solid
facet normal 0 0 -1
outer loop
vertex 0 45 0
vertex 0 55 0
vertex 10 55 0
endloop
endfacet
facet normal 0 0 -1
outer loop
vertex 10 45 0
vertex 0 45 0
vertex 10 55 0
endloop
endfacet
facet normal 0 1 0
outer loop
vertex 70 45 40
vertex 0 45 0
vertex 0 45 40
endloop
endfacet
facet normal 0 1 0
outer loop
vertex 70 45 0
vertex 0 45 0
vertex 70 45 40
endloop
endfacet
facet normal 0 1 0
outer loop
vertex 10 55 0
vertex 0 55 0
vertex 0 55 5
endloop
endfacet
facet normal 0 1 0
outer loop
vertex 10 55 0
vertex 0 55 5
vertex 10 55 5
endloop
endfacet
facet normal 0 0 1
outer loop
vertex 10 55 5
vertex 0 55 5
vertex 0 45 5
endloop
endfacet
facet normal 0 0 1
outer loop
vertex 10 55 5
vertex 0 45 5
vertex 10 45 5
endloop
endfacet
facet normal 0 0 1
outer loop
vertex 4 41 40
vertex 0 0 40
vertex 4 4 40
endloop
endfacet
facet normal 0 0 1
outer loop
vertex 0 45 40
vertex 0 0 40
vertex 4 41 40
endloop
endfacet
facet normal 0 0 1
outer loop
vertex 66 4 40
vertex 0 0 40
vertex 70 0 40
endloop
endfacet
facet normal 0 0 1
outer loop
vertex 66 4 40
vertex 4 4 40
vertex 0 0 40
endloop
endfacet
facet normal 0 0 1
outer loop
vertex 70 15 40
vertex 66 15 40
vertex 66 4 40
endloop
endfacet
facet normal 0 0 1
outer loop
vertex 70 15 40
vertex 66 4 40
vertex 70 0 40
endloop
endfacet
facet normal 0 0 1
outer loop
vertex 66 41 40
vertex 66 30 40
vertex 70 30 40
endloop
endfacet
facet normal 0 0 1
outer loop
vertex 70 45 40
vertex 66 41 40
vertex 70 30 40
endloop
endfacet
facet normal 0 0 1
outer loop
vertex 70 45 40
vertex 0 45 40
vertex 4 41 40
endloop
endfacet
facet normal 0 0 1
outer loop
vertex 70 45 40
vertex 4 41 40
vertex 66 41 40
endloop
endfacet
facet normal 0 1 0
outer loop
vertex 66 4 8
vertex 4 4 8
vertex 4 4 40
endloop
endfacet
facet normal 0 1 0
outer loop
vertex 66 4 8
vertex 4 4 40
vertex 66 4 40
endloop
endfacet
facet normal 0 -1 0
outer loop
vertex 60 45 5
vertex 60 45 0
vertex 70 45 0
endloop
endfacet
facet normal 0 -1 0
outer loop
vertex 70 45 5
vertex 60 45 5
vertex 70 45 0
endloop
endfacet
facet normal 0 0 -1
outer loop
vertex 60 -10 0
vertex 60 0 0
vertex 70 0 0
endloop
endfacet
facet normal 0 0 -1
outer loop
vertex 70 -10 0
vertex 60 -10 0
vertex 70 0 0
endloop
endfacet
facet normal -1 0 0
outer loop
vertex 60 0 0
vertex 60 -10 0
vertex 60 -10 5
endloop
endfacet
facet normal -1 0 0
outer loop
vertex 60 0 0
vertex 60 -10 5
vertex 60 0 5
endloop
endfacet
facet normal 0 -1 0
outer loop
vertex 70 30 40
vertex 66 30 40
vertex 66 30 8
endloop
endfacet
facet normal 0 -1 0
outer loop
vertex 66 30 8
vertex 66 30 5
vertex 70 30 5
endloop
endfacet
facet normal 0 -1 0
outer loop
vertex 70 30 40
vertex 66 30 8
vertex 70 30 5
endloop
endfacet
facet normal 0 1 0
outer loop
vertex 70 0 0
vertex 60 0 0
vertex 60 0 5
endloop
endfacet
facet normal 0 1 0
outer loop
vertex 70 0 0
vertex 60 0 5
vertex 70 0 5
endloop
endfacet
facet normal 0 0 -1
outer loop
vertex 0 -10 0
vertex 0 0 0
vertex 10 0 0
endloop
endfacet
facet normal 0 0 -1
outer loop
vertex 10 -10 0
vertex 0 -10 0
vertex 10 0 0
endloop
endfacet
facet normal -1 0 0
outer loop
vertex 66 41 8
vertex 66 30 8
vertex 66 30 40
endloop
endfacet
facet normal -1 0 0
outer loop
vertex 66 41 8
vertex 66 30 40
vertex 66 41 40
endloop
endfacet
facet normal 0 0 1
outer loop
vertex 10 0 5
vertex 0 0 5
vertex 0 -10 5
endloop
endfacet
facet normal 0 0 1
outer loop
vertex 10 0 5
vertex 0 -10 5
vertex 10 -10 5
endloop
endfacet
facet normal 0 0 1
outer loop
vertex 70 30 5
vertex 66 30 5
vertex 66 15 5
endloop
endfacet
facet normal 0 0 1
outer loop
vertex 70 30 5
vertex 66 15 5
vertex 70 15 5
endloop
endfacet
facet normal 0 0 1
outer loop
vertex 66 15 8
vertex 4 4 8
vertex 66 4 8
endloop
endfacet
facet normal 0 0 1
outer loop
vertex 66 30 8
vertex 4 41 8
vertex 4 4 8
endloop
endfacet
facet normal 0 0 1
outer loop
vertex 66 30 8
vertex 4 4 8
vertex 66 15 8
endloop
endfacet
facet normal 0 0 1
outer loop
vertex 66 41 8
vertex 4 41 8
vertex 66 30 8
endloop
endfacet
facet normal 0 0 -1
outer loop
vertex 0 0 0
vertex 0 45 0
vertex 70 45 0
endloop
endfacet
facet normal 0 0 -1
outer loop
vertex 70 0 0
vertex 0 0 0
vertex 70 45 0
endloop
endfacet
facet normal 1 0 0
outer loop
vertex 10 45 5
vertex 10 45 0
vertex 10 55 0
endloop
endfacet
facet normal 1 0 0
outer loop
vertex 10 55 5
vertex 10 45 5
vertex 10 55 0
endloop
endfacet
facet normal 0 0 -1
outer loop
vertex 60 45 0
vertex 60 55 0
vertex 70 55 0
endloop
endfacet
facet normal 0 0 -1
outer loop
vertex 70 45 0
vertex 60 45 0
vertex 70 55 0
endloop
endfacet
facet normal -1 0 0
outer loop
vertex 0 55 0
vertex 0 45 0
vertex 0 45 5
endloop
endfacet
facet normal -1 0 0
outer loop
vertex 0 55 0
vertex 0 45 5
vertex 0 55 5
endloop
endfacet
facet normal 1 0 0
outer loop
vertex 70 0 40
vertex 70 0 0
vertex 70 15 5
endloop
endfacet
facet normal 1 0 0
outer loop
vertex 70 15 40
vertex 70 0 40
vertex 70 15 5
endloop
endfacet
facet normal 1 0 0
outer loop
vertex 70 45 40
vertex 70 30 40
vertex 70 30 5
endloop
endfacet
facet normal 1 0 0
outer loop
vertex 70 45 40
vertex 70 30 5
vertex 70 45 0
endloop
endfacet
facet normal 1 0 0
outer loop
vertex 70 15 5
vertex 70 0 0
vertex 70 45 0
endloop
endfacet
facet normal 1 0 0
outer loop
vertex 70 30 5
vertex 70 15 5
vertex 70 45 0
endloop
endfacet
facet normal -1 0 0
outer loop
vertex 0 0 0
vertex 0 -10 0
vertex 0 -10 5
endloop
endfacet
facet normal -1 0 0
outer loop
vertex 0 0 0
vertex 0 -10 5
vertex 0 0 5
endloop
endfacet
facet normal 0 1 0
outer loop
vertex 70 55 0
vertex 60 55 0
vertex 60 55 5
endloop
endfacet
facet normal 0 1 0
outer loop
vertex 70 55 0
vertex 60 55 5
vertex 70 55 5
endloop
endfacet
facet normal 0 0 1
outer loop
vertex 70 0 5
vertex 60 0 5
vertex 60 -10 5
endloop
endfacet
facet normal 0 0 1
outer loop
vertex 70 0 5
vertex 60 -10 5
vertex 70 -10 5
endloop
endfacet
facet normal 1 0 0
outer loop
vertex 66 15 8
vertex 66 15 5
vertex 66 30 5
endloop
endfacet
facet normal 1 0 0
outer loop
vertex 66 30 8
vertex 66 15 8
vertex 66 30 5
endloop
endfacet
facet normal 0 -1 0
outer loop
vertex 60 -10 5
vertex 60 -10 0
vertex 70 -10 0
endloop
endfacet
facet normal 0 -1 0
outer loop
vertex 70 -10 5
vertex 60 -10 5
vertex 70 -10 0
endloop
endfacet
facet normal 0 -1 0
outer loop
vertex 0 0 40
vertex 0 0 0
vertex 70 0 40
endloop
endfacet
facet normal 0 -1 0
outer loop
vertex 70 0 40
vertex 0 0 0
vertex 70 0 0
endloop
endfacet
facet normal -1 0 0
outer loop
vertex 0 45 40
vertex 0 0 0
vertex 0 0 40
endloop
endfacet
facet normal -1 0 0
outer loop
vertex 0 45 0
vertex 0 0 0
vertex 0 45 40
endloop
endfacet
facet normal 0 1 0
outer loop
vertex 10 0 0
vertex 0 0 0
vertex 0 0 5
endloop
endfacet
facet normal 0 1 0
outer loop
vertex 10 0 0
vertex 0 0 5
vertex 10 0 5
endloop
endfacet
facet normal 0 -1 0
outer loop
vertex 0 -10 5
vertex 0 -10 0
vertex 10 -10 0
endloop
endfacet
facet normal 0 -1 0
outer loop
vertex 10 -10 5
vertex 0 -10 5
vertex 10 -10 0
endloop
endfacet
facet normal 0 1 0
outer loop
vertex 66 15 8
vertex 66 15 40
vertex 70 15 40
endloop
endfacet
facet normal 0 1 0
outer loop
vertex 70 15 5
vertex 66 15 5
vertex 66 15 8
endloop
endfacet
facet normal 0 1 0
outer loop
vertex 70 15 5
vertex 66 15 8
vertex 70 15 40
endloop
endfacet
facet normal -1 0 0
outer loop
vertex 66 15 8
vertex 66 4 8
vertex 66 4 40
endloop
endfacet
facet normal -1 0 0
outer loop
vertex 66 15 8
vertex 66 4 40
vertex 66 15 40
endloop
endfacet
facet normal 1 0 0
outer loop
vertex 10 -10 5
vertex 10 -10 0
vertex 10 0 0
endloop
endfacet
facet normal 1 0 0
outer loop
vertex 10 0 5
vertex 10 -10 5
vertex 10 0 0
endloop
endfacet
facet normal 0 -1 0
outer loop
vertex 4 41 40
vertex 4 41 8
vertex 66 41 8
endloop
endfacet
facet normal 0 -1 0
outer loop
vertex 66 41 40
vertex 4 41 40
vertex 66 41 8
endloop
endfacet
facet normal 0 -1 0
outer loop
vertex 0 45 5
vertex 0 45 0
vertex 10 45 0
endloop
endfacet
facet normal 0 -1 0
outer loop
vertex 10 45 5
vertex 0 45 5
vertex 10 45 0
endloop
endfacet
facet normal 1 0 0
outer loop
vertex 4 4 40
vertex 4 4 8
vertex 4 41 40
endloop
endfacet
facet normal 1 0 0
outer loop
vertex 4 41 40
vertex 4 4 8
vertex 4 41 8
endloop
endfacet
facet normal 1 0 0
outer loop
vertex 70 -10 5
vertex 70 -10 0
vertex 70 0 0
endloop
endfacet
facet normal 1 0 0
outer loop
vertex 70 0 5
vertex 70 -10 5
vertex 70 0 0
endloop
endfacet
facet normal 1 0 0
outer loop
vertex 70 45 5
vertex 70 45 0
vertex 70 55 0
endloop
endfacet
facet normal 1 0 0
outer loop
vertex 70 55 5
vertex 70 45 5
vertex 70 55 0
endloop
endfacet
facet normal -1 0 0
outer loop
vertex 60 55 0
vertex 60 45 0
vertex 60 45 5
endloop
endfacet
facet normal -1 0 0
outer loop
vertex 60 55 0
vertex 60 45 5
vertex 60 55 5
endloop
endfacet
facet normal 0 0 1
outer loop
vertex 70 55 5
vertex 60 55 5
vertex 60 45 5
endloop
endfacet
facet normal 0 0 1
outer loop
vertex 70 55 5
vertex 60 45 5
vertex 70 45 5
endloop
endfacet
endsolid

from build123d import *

# Parameters (mm, degrees)
BOX003_W     = 10
BOX003_H     = 10
BOX003_DEPTH = 5
BOX004_W     = 10
BOX004_H     = 10
BOX004_DEPTH = 5
BOX005_W     = 10
BOX005_H     = 10
BOX005_DEPTH = 5
BOX006_W     = 10
BOX006_H     = 10
BOX006_DEPTH = 5
BOX002_W     = 4
BOX002_H     = 15
BOX002_DEPTH = 35
BOX001_W     = 62
BOX001_H     = 37
BOX001_DEPTH = 32
BOX_W        = 70
BOX_H        = 45
BOX_DEPTH    = 40


with BuildPart() as cube003:
    # Box003 → Box003 (new body)
    with BuildSketch(Plane(origin=(0, -10, 0), x_dir=(1, 0, 0), z_dir=(0, 0, 1))):
        with Locations((5, 5)):
            Rectangle(BOX003_W, BOX003_H)
    extrude(amount=BOX003_DEPTH)


with BuildPart() as cube004:
    # Box004 → Box004 (new body)
    with BuildSketch(Plane(origin=(60, -10, 0), x_dir=(1, 0, 0), z_dir=(0, 0, 1))):
        with Locations((5, 5)):
            Rectangle(BOX004_W, BOX004_H)
    extrude(amount=BOX004_DEPTH)


with BuildPart() as cube005:
    # Box005 → Box005 (new body)
    with BuildSketch(Plane(origin=(0, 45, 0), x_dir=(1, 0, 0), z_dir=(0, 0, 1))):
        with Locations((5, 5)):
            Rectangle(BOX005_W, BOX005_H)
    extrude(amount=BOX005_DEPTH)


with BuildPart() as cube006:
    # Box006 → Box006 (new body)
    with BuildSketch(Plane(origin=(60, 45, 0), x_dir=(1, 0, 0), z_dir=(0, 0, 1))):
        with Locations((5, 5)):
            Rectangle(BOX006_W, BOX006_H)
    extrude(amount=BOX006_DEPTH)


with BuildPart() as cube002:
    # Box002 → Box002 (new body)
    with BuildSketch(Plane(origin=(66, 15, 5), x_dir=(1, 0, 0), z_dir=(0, 0, 1))):
        with Locations((2, 7.5)):
            Rectangle(BOX002_W, BOX002_H)
    extrude(amount=BOX002_DEPTH)


with BuildPart() as cube001:
    # Box001 → Box001 (new body)
    with BuildSketch(Plane(origin=(4, 4, 8), x_dir=(1, 0, 0), z_dir=(0, 0, 1))):
        with Locations((31, 18.5)):
            Rectangle(BOX001_W, BOX001_H)
    extrude(amount=BOX001_DEPTH)


with BuildPart() as cut001:
    # Box → Box (new body)
    with BuildSketch(Plane.XY):
        with Locations((35, 22.5)):
            Rectangle(BOX_W, BOX_H)
    extrude(amount=BOX_DEPTH)

    # Cut: cut Cube001
    add(cube001.part, mode=Mode.SUBTRACT)

    # Cut001: cut Cube002
    add(cube002.part, mode=Mode.SUBTRACT)


solid = Compound([cube003.part, cube004.part, cube005.part, cube006.part, cut001.part])
